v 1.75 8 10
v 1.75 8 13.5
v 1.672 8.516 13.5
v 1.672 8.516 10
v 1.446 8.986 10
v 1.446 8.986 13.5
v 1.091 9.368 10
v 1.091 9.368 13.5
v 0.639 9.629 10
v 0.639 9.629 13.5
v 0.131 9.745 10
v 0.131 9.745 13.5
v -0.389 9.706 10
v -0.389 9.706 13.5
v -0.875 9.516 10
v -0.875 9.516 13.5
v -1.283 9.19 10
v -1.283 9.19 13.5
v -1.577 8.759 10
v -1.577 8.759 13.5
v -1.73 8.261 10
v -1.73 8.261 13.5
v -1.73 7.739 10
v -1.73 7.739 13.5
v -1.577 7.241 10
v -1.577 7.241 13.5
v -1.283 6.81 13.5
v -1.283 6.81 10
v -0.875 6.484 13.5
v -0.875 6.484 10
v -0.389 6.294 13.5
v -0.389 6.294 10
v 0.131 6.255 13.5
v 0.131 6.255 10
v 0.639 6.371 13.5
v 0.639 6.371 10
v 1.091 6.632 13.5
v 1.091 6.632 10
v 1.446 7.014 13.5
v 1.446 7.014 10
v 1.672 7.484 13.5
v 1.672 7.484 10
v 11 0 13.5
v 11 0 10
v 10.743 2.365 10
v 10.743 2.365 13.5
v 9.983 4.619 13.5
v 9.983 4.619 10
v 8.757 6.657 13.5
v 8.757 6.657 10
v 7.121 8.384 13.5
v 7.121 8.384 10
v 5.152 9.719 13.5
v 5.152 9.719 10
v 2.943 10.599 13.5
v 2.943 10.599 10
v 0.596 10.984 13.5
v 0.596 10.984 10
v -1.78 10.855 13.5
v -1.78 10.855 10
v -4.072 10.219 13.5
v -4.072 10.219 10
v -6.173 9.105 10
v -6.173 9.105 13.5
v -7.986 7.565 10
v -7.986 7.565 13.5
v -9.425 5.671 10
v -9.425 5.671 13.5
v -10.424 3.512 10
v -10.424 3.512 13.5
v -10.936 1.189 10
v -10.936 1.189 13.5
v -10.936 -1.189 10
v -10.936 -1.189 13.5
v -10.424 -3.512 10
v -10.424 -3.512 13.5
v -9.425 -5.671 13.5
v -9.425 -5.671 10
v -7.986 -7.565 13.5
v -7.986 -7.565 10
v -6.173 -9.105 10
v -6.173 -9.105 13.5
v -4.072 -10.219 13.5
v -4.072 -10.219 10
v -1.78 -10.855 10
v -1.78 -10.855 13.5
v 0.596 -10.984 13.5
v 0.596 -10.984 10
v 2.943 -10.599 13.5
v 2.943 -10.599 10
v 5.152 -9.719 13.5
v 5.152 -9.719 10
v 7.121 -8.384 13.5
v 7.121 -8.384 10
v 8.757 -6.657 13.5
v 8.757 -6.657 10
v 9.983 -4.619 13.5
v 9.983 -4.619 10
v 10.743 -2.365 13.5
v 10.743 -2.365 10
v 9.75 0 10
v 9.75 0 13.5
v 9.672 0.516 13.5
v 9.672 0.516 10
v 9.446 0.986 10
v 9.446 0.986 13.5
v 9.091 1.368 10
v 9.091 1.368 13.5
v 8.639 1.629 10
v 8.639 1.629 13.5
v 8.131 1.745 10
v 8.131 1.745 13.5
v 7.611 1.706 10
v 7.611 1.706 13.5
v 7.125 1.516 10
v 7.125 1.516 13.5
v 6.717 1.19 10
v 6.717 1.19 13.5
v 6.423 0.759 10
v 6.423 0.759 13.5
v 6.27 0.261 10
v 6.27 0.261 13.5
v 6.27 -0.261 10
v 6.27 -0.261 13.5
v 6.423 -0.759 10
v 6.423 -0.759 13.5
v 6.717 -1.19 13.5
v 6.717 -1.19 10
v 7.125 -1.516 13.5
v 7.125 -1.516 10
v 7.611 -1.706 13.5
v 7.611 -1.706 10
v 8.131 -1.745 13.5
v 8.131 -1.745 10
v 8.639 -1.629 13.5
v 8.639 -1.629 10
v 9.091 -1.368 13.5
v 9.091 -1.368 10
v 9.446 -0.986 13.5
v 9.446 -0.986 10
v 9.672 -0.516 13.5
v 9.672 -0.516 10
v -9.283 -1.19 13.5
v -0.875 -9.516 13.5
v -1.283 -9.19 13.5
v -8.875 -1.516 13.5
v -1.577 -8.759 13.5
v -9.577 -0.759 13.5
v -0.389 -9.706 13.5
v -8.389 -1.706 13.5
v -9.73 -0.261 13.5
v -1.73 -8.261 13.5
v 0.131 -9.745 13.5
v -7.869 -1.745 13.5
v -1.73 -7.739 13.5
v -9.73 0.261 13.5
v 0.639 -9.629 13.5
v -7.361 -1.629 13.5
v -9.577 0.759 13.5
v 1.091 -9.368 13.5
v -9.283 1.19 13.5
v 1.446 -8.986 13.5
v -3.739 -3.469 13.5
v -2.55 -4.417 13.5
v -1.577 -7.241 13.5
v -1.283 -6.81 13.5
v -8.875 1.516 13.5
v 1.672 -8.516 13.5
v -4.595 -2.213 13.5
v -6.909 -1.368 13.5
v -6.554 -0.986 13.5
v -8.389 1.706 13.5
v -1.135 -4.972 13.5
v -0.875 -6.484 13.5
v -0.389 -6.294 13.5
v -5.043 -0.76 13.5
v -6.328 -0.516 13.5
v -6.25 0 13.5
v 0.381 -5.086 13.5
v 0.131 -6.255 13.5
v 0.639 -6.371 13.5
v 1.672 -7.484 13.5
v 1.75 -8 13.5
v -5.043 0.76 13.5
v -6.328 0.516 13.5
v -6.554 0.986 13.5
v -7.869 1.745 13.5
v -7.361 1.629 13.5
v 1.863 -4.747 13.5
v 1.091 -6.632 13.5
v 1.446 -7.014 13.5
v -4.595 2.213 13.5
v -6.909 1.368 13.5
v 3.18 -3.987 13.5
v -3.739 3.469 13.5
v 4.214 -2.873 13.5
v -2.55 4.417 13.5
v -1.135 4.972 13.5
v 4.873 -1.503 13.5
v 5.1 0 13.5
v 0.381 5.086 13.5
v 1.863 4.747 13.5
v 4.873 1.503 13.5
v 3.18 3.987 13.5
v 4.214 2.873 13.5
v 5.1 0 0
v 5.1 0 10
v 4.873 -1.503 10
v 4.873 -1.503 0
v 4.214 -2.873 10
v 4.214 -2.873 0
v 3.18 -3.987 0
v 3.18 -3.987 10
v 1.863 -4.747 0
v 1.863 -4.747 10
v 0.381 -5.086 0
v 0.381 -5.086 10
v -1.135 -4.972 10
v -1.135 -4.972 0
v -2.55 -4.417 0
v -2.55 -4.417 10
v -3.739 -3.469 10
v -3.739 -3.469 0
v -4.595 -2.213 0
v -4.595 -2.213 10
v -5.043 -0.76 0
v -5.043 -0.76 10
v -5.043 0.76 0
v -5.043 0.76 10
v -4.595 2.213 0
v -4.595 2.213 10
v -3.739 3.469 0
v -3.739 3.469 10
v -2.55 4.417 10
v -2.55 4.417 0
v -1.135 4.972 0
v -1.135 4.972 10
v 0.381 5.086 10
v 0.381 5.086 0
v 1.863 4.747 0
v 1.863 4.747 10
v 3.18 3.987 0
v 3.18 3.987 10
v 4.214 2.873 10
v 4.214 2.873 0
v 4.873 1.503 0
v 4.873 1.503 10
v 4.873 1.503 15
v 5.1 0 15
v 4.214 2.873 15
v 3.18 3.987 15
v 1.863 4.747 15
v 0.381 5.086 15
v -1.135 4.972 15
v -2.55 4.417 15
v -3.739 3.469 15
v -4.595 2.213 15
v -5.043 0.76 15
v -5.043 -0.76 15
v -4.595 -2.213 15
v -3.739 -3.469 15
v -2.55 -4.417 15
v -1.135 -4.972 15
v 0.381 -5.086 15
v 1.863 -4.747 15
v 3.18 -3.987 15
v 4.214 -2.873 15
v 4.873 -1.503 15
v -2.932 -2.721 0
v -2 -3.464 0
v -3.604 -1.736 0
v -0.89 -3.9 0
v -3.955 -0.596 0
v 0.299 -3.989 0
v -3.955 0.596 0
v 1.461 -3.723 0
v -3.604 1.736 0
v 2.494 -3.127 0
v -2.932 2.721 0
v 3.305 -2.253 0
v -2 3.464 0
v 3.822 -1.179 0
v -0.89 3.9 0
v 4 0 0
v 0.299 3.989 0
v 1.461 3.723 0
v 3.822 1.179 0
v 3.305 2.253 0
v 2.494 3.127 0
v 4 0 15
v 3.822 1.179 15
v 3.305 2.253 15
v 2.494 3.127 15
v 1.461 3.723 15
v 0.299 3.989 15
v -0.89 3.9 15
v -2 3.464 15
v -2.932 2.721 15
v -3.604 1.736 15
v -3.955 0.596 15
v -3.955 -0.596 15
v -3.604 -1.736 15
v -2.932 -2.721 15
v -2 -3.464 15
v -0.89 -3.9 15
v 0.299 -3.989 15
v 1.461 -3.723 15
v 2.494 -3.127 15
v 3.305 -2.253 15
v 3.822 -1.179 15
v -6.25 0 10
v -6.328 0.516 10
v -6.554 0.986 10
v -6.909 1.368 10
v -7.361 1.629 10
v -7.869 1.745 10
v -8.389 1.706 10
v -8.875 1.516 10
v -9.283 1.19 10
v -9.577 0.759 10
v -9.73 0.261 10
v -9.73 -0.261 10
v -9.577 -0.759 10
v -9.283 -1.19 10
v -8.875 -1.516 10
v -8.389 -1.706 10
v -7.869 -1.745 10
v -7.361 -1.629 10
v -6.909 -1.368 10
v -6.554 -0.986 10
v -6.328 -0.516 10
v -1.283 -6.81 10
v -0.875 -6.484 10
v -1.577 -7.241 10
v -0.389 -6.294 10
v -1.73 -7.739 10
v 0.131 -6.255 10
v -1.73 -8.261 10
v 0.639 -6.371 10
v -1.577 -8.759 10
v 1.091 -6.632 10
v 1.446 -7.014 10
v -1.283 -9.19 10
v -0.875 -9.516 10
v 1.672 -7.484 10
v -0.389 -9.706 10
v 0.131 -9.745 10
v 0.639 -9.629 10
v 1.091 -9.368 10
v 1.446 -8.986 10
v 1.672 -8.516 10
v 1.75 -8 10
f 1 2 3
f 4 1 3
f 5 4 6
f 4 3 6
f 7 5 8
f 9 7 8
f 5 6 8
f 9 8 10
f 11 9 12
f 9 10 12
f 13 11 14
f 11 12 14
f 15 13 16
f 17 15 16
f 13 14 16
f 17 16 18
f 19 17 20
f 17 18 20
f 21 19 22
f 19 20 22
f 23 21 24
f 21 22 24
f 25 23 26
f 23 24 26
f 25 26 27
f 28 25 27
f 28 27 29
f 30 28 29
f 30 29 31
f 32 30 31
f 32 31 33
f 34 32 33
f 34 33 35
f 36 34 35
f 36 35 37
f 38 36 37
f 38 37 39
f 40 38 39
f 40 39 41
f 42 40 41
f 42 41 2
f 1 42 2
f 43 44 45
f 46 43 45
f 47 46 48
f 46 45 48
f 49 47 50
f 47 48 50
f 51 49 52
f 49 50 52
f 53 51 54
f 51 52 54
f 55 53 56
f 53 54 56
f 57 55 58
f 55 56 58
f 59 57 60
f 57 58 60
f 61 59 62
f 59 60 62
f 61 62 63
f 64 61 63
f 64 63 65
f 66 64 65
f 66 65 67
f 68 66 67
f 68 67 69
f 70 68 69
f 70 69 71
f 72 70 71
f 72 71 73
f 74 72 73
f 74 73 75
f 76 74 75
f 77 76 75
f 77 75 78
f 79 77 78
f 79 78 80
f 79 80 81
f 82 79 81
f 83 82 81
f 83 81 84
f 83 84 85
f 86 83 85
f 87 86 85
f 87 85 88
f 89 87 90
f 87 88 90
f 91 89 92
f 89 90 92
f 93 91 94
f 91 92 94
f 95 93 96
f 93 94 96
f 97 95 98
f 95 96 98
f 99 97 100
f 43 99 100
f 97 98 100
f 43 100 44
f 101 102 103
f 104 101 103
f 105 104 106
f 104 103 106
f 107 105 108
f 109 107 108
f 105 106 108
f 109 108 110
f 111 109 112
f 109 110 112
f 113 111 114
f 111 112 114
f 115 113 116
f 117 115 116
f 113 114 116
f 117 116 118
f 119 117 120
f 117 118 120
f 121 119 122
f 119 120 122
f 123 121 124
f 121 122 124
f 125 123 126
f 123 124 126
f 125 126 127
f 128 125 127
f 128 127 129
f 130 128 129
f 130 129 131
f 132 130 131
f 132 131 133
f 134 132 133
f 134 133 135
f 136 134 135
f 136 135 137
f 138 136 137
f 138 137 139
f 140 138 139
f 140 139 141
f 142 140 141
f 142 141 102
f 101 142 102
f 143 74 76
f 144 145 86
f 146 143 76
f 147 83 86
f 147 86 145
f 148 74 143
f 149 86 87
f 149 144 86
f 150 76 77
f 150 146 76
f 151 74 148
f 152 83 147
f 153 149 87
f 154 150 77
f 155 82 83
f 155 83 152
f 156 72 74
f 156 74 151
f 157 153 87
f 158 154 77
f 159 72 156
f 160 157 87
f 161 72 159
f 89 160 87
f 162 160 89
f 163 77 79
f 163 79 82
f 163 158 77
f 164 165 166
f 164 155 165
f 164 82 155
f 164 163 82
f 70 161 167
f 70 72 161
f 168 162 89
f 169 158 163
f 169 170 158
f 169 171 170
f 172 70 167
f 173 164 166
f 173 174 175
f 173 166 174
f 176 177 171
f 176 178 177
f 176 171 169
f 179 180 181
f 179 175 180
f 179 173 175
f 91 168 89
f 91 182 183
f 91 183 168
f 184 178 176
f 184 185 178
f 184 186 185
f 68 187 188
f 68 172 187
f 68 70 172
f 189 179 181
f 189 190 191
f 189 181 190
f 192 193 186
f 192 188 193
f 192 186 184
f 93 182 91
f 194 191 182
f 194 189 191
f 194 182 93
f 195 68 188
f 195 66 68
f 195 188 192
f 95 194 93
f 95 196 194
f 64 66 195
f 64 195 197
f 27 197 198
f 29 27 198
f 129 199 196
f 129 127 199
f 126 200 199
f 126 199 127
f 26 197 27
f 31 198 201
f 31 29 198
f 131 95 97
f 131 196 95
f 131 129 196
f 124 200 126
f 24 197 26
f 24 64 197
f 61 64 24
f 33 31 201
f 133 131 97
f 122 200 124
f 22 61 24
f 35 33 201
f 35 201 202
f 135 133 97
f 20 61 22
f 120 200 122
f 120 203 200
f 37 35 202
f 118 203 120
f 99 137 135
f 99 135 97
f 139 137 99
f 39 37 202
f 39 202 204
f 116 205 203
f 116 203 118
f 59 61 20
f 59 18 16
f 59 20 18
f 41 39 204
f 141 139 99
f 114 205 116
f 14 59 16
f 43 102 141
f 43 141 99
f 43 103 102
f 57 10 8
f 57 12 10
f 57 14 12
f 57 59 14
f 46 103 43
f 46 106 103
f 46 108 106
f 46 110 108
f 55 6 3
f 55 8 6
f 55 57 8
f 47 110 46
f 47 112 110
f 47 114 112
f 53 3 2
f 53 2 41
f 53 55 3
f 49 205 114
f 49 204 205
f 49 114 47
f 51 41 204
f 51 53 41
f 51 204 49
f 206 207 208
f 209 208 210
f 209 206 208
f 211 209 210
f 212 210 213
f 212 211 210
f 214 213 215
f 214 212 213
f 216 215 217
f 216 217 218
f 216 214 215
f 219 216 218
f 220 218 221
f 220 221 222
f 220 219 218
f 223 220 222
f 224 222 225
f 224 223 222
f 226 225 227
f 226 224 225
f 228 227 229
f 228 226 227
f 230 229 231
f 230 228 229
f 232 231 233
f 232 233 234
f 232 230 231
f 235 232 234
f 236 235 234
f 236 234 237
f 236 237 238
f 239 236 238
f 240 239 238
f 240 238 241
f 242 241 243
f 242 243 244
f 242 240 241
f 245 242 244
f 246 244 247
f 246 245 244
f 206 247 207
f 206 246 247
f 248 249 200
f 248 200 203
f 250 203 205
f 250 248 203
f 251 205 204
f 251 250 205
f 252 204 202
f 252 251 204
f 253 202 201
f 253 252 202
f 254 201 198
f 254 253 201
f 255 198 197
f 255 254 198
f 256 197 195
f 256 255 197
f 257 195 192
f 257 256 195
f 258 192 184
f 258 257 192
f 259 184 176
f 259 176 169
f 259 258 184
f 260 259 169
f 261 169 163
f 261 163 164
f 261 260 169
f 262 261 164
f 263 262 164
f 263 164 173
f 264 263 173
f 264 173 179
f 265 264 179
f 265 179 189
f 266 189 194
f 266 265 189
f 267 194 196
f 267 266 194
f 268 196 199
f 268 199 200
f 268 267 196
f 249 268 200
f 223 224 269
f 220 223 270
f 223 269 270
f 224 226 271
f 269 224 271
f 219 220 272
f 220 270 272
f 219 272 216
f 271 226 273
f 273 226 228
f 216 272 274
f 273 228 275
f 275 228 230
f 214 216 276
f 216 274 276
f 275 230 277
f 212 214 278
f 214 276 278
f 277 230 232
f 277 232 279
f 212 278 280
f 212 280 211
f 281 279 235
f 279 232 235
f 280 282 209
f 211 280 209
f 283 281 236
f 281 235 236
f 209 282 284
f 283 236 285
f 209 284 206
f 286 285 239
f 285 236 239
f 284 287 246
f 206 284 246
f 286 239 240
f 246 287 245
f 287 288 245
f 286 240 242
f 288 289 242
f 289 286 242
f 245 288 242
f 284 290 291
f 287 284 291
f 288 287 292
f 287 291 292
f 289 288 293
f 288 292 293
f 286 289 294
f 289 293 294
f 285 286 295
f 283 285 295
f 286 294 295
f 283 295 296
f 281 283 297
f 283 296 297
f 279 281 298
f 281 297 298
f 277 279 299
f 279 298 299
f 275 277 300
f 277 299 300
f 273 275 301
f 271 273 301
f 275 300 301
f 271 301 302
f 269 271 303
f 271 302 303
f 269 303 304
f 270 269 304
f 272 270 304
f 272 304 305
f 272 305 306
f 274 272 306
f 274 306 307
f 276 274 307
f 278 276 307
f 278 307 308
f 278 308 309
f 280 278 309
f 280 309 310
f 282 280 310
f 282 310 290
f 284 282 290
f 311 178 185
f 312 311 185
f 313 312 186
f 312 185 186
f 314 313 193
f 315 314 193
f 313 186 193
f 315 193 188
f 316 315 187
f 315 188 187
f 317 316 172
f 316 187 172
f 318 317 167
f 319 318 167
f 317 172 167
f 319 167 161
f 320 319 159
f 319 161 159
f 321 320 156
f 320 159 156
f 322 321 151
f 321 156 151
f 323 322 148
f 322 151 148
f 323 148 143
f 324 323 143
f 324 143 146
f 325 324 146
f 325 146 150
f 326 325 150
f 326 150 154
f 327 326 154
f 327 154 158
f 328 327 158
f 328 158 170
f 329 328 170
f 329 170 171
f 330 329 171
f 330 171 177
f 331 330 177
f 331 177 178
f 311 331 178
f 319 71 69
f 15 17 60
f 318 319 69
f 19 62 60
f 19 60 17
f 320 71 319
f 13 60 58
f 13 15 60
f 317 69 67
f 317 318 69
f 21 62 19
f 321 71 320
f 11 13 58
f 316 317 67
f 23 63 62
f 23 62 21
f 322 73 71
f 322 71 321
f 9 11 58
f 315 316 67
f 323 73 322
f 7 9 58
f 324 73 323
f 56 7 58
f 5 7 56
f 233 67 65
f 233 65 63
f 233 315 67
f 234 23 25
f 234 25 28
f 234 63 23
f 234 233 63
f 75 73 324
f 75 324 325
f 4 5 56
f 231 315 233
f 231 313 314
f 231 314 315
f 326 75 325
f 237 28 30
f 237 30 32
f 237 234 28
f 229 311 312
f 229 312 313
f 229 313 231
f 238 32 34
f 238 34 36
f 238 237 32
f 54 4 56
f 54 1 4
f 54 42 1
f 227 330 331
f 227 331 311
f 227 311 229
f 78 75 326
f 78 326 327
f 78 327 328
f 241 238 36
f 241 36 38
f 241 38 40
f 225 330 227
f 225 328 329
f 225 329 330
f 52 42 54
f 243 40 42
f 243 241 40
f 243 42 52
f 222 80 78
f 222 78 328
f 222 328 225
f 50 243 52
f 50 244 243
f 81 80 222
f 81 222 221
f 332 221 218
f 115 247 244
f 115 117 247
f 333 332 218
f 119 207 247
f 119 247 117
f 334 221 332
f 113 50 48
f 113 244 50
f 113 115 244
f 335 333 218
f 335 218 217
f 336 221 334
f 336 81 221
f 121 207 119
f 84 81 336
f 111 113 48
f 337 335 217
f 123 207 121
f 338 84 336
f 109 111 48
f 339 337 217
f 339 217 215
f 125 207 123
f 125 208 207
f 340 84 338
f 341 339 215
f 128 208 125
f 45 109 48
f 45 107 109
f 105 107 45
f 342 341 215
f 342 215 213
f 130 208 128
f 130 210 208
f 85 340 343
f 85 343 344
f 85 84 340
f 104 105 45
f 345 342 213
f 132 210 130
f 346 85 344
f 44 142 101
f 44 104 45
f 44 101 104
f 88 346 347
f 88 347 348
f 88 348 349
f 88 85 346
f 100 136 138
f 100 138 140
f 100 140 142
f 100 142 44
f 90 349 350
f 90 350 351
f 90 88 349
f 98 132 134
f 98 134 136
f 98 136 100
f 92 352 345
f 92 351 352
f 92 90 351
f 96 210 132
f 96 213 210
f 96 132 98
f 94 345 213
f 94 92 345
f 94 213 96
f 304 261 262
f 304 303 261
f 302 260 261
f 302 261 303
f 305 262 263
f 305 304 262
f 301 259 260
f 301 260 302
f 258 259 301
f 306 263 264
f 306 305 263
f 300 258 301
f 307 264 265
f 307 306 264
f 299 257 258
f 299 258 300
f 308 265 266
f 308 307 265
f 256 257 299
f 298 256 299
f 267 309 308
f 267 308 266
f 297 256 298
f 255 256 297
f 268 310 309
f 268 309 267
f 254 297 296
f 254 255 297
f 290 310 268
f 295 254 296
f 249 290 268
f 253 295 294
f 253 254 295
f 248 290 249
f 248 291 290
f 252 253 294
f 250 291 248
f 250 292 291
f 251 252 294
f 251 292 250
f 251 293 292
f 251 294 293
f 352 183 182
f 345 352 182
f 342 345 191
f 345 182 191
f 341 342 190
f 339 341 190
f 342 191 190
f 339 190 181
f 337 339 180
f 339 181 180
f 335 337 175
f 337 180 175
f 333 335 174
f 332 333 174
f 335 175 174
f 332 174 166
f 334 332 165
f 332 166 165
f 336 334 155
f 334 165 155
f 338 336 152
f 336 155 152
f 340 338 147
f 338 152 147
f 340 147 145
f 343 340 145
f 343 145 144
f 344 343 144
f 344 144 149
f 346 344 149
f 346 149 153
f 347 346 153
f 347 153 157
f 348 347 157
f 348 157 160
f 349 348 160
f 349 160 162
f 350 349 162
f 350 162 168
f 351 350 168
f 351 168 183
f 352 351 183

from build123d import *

# Parameters (mm, degrees)
SKETCH_R        = 11
PAD_DEPTH       = 15
SKETCH001_R     = 11
SKETCH001_R_2   = 5.1
POCKET_DEPTH    = 1.5
SKETCH002_R     = 11
SKETCH002_R_2   = 5.1
POCKET001_DEPTH = 10
SKETCH003_R     = 1.75
POCKET002_DEPTH = 13.501
SKETCH004_R     = 4
POCKET003_DEPTH = 15.001


with BuildPart() as part:
    # Sketch → Pad (new body)
    with BuildSketch(Plane.XY):
        Circle(SKETCH_R)
    extrude(amount=PAD_DEPTH)

    # Sketch001 (on Face3 of Pad) → Pocket (cut)
    with BuildSketch(Plane.XY.offset(15)):
        Circle(SKETCH001_R)
        Circle(SKETCH001_R_2, mode=Mode.SUBTRACT)
    extrude(amount=-POCKET_DEPTH, mode=Mode.SUBTRACT)

    # Sketch002 (on Face2 of Pocket) → Pocket001 (cut)
    with BuildSketch(Plane(origin=(0, 0, 0), x_dir=(1, 0, 0), z_dir=(0, 0, -1))):
        Circle(SKETCH002_R)
        Circle(SKETCH002_R_2, mode=Mode.SUBTRACT)
    extrude(amount=-POCKET001_DEPTH, mode=Mode.SUBTRACT)

    # Sketch003 (on Face3 of Pocket001) → Pocket002 (cut, through all)
    with BuildSketch(Plane.XY.offset(13.5)):
        with Locations((8, 0)):
            Circle(SKETCH003_R)
        with Locations((-8, 0)):
            Circle(SKETCH003_R)
        with Locations((0, 8)):
            Circle(SKETCH003_R)
        with Locations((0, -8)):
            Circle(SKETCH003_R)
    extrude(amount=-POCKET002_DEPTH, mode=Mode.SUBTRACT)

    # Sketch004 (on Face11 of Pocket002) → Pocket003 (cut, through all)
    with BuildSketch(Plane.XY.offset(15)):
        Circle(SKETCH004_R)
    extrude(amount=-POCKET003_DEPTH, mode=Mode.SUBTRACT)


solid = part.part
